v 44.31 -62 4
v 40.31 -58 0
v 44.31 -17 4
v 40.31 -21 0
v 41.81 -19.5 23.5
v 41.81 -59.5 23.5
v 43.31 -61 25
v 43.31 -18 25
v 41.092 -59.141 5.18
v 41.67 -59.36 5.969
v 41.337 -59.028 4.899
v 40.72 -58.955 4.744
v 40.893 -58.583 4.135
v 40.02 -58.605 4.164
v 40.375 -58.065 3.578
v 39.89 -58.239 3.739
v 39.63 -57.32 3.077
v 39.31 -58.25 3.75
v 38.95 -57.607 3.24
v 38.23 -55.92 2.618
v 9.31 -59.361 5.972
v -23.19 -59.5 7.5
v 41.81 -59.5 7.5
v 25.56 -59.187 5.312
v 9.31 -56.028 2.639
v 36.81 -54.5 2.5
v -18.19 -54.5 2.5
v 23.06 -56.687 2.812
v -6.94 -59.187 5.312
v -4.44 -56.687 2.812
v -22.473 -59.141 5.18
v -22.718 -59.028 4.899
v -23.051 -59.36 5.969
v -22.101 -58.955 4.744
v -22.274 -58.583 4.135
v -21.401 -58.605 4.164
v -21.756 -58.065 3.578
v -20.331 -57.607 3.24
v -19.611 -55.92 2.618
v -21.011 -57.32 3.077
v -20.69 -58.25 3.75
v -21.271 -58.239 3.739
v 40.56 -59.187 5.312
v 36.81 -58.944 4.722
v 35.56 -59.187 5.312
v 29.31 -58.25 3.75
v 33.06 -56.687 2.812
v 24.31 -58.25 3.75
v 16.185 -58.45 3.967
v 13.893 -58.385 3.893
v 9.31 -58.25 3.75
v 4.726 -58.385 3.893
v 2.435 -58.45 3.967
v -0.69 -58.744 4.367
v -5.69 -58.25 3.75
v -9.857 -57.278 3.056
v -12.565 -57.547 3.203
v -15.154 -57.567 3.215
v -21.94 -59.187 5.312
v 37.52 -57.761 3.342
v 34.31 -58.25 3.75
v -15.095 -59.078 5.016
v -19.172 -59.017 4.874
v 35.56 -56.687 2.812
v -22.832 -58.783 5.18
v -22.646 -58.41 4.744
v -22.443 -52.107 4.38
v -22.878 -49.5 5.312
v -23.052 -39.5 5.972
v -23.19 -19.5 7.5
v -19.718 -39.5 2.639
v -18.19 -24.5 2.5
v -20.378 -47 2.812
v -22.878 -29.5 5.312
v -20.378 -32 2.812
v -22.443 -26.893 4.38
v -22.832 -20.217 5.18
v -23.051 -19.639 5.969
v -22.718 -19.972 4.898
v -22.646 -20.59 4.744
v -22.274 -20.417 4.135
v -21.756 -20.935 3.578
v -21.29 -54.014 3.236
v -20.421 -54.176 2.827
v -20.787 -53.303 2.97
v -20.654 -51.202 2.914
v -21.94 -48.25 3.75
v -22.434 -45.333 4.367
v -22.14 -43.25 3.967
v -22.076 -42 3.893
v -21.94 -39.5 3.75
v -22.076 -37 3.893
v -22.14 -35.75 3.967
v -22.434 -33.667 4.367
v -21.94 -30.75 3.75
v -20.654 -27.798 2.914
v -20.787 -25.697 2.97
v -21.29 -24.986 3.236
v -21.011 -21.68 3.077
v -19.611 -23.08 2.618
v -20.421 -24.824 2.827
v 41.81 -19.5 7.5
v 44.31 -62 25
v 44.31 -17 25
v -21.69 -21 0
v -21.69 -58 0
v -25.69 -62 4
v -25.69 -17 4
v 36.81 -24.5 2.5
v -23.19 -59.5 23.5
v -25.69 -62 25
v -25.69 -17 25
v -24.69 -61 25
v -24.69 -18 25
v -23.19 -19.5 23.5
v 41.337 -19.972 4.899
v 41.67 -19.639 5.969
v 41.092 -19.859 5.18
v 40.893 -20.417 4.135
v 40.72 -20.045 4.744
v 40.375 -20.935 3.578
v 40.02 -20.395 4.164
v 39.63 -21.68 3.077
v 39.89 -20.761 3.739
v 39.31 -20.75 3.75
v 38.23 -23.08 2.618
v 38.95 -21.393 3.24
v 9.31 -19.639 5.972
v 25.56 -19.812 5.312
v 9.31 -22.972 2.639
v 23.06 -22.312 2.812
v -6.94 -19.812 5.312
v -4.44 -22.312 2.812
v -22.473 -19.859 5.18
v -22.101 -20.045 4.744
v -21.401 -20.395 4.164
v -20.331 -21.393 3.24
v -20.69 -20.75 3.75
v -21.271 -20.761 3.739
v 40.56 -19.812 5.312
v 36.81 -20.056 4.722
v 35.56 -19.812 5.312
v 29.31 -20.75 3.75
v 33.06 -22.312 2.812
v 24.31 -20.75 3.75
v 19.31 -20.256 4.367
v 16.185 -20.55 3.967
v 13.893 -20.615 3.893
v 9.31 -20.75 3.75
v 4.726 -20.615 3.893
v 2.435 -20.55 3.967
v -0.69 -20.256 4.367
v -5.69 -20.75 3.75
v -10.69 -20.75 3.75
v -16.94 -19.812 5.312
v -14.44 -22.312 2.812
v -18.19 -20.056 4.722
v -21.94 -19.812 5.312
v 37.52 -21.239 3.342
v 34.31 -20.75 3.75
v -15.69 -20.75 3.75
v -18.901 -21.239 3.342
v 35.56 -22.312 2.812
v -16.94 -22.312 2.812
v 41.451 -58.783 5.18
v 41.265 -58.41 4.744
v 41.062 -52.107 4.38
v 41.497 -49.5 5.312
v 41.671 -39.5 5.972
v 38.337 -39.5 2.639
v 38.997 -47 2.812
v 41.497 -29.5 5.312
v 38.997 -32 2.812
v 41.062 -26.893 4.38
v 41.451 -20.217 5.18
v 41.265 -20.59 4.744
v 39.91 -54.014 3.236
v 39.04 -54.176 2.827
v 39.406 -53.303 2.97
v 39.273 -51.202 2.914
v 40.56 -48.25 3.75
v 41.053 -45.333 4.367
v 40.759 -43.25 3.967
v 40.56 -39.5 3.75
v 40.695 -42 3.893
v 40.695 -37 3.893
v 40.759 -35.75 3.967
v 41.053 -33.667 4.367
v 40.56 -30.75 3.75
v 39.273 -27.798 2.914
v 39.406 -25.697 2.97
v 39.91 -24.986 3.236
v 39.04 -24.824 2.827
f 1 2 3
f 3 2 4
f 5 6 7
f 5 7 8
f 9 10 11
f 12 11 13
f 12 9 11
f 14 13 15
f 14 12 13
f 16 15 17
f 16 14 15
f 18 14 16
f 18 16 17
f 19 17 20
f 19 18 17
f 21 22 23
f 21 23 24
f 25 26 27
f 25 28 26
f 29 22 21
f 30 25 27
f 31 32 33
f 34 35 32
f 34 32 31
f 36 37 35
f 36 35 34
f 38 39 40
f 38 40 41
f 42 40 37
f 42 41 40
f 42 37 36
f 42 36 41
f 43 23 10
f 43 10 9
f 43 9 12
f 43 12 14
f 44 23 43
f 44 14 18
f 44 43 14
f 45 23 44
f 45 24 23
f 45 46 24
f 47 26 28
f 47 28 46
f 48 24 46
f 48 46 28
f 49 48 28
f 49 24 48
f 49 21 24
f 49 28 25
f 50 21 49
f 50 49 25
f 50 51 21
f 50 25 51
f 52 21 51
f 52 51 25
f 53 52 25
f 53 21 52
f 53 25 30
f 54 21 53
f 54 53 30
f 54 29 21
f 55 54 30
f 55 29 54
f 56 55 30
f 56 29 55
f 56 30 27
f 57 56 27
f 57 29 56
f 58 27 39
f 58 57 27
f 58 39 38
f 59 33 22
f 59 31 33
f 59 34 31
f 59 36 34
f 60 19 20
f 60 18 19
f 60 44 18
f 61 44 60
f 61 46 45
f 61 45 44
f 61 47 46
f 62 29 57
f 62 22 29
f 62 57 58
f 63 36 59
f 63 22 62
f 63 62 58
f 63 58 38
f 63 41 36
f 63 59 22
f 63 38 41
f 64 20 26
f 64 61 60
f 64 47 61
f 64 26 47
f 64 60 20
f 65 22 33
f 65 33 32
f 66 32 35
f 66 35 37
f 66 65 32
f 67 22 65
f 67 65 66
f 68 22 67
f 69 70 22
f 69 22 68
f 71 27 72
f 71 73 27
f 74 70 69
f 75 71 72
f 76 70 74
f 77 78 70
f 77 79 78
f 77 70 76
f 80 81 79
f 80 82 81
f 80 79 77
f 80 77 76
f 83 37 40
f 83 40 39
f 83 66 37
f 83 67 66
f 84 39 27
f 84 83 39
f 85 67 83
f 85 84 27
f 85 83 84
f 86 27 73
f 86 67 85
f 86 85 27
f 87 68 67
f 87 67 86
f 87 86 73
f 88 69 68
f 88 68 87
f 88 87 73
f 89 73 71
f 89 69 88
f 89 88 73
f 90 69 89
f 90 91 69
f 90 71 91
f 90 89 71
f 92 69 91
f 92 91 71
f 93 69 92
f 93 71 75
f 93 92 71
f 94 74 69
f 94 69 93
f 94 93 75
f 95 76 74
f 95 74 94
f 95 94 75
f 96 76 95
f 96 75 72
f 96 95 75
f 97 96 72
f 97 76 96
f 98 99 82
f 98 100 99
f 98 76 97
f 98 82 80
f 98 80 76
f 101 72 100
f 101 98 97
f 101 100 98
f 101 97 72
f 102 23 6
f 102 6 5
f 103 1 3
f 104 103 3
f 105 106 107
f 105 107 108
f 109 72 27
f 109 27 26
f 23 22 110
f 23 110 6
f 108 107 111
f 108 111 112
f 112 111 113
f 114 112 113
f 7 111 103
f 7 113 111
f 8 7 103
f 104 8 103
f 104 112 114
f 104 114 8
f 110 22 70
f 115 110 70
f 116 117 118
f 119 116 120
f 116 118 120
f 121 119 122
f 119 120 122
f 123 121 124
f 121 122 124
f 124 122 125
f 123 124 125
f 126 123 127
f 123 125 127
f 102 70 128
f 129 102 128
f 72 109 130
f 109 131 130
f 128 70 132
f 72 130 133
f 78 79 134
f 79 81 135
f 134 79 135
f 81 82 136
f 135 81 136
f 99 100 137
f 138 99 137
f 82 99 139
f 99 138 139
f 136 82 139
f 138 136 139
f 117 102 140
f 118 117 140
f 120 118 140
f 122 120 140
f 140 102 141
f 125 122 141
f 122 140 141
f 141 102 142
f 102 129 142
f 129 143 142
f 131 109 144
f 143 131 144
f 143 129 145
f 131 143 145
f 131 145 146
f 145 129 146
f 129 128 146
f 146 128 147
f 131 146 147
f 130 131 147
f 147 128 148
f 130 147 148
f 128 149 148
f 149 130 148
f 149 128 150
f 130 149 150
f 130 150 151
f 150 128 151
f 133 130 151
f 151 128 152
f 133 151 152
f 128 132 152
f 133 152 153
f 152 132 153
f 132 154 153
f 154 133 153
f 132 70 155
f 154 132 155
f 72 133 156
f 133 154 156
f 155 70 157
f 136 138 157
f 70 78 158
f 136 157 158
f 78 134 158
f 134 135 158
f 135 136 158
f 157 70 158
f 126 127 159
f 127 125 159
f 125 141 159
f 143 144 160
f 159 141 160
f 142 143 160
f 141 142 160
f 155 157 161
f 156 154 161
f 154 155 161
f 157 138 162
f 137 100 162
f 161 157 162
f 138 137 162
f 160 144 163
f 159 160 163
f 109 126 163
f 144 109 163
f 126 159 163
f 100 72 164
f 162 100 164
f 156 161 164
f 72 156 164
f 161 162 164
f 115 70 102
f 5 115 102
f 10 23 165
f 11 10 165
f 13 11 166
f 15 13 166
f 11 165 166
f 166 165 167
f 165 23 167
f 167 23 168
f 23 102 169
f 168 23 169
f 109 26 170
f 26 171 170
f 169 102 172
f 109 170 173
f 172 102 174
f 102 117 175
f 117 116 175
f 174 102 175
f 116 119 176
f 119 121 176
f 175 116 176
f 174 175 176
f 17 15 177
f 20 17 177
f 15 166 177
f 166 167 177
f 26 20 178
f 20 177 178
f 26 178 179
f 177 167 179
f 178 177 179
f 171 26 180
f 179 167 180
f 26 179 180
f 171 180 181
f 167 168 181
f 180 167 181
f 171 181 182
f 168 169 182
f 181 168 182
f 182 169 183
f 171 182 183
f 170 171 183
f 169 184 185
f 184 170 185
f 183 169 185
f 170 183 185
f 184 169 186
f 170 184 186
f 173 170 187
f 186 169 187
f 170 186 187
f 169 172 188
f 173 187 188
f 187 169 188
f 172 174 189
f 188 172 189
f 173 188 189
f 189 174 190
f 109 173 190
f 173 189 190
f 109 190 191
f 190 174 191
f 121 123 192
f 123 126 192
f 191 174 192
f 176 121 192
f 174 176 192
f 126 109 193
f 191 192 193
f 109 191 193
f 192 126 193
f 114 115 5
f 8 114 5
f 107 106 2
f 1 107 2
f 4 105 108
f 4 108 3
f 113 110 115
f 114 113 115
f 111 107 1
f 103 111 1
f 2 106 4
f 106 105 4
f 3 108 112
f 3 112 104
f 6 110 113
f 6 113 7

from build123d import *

# Parameters (mm, degrees)
F0_W        = 70
F0_H        = 45
F1_DEPTH    = 25
F2_T        = -2.5
F3_T1_DEPTH = 40
F3_T3_DEPTH = 65
F4_SIZE     = 4
F5_SIZE     = 1.5


# Not quite as in the source:
# - a fillet or chamfer that OpenCascade refuses, or shapes differently, is made with other operations: its cross-section is extruded or revolved along the edge and cut away or added


with BuildPart() as f1:
    # F0 (on Top) → F1 (new body)
    with BuildSketch(Plane.XY):
        with Locations((9.3095207959, -39.4999814034)):
            Rectangle(F0_W, F0_H)
    extrude(amount=F1_DEPTH)

    # F2
    f2_openings = [f1.faces().sort_by_distance(p)[0] for p in [
        (9.309521, -39.499981, 25),
    ]]
    offset(amount=F2_T, openings=f2_openings)

    # F3: fillet of radius 5 on 4 edges, made by hand

    # F3_s2 → F3_t1 (join)
    with BuildSketch(Plane.XZ.offset(19.4999814034)):
        with BuildLine():
            add(Edge.make_bspline(
                [(-23.1904792041, 7.5), (-23.1904792041, 2.5), (-18.1904792041, 2.5)],
                knots=[0, 0, 0, 1, 1, 1], degree=2, weights=[1, 1, 1]))
            Line((-18.1904792041, 2.5), (-23.1904792041, 2.5))
            Line((-23.1904792041, 2.5), (-23.1904792041, 7.5))
        make_face()
        with BuildLine():
            add(Edge.make_bspline(
                [(41.8095207959, 7.5), (41.8095207959, 2.5), (36.8095207959, 2.5)],
                knots=[0, 0, 0, 1, 1, 1], degree=2, weights=[1, 1, 1]))
            Line((36.8095207959, 2.5), (41.8095207959, 2.5))
            Line((41.8095207959, 2.5), (41.8095207959, 7.5))
        make_face()
    extrude(amount=F3_T1_DEPTH)

    # F3_s4 → F3_t3 (join)
    with BuildSketch(Plane.YZ.offset(-23.1904792041)):
        with BuildLine():
            add(Edge.make_bspline(
                [(-19.4999814034, 7.5), (-19.4999814034, 2.5), (-24.4999814034, 2.5)],
                knots=[0, 0, 0, 1, 1, 1], degree=2, weights=[1, 1, 1]))
            Line((-24.4999814034, 2.5), (-19.4999814034, 2.5))
            Line((-19.4999814034, 2.5), (-19.4999814034, 7.5))
        make_face()
        with BuildLine():
            add(Edge.make_bspline(
                [(-59.4999814034, 7.5), (-59.4999814034, 2.5), (-54.4999814034, 2.5)],
                knots=[0, 0, 0, 1, 1, 1], degree=2, weights=[1, 1, 1]))
            Line((-54.4999814034, 2.5), (-59.4999814034, 2.5))
            Line((-59.4999814034, 2.5), (-59.4999814034, 7.5))
        make_face()
    extrude(amount=F3_T3_DEPTH)

    # F4
    f4_edges = [f1.edges().sort_by_distance(p)[0] for p in [
        (9.309521, -61.999981, 0),
        (-25.690479, -39.499981, 0),
        (44.309521, -39.499981, 0),
        (9.309521, -16.999981, 0),
    ]]
    chamfer(f4_edges, length=F4_SIZE)

    # F5
    f5_edges = [f1.edges().sort_by_distance(p)[0] for p in [
        (9.309521, -19.499981, 25),
        (-23.190479, -39.499981, 25),
        (9.309521, -59.499981, 25),
        (41.809521, -39.499981, 25),
    ]]
    chamfer(f5_edges, length=F5_SIZE)


solid = f1.part
